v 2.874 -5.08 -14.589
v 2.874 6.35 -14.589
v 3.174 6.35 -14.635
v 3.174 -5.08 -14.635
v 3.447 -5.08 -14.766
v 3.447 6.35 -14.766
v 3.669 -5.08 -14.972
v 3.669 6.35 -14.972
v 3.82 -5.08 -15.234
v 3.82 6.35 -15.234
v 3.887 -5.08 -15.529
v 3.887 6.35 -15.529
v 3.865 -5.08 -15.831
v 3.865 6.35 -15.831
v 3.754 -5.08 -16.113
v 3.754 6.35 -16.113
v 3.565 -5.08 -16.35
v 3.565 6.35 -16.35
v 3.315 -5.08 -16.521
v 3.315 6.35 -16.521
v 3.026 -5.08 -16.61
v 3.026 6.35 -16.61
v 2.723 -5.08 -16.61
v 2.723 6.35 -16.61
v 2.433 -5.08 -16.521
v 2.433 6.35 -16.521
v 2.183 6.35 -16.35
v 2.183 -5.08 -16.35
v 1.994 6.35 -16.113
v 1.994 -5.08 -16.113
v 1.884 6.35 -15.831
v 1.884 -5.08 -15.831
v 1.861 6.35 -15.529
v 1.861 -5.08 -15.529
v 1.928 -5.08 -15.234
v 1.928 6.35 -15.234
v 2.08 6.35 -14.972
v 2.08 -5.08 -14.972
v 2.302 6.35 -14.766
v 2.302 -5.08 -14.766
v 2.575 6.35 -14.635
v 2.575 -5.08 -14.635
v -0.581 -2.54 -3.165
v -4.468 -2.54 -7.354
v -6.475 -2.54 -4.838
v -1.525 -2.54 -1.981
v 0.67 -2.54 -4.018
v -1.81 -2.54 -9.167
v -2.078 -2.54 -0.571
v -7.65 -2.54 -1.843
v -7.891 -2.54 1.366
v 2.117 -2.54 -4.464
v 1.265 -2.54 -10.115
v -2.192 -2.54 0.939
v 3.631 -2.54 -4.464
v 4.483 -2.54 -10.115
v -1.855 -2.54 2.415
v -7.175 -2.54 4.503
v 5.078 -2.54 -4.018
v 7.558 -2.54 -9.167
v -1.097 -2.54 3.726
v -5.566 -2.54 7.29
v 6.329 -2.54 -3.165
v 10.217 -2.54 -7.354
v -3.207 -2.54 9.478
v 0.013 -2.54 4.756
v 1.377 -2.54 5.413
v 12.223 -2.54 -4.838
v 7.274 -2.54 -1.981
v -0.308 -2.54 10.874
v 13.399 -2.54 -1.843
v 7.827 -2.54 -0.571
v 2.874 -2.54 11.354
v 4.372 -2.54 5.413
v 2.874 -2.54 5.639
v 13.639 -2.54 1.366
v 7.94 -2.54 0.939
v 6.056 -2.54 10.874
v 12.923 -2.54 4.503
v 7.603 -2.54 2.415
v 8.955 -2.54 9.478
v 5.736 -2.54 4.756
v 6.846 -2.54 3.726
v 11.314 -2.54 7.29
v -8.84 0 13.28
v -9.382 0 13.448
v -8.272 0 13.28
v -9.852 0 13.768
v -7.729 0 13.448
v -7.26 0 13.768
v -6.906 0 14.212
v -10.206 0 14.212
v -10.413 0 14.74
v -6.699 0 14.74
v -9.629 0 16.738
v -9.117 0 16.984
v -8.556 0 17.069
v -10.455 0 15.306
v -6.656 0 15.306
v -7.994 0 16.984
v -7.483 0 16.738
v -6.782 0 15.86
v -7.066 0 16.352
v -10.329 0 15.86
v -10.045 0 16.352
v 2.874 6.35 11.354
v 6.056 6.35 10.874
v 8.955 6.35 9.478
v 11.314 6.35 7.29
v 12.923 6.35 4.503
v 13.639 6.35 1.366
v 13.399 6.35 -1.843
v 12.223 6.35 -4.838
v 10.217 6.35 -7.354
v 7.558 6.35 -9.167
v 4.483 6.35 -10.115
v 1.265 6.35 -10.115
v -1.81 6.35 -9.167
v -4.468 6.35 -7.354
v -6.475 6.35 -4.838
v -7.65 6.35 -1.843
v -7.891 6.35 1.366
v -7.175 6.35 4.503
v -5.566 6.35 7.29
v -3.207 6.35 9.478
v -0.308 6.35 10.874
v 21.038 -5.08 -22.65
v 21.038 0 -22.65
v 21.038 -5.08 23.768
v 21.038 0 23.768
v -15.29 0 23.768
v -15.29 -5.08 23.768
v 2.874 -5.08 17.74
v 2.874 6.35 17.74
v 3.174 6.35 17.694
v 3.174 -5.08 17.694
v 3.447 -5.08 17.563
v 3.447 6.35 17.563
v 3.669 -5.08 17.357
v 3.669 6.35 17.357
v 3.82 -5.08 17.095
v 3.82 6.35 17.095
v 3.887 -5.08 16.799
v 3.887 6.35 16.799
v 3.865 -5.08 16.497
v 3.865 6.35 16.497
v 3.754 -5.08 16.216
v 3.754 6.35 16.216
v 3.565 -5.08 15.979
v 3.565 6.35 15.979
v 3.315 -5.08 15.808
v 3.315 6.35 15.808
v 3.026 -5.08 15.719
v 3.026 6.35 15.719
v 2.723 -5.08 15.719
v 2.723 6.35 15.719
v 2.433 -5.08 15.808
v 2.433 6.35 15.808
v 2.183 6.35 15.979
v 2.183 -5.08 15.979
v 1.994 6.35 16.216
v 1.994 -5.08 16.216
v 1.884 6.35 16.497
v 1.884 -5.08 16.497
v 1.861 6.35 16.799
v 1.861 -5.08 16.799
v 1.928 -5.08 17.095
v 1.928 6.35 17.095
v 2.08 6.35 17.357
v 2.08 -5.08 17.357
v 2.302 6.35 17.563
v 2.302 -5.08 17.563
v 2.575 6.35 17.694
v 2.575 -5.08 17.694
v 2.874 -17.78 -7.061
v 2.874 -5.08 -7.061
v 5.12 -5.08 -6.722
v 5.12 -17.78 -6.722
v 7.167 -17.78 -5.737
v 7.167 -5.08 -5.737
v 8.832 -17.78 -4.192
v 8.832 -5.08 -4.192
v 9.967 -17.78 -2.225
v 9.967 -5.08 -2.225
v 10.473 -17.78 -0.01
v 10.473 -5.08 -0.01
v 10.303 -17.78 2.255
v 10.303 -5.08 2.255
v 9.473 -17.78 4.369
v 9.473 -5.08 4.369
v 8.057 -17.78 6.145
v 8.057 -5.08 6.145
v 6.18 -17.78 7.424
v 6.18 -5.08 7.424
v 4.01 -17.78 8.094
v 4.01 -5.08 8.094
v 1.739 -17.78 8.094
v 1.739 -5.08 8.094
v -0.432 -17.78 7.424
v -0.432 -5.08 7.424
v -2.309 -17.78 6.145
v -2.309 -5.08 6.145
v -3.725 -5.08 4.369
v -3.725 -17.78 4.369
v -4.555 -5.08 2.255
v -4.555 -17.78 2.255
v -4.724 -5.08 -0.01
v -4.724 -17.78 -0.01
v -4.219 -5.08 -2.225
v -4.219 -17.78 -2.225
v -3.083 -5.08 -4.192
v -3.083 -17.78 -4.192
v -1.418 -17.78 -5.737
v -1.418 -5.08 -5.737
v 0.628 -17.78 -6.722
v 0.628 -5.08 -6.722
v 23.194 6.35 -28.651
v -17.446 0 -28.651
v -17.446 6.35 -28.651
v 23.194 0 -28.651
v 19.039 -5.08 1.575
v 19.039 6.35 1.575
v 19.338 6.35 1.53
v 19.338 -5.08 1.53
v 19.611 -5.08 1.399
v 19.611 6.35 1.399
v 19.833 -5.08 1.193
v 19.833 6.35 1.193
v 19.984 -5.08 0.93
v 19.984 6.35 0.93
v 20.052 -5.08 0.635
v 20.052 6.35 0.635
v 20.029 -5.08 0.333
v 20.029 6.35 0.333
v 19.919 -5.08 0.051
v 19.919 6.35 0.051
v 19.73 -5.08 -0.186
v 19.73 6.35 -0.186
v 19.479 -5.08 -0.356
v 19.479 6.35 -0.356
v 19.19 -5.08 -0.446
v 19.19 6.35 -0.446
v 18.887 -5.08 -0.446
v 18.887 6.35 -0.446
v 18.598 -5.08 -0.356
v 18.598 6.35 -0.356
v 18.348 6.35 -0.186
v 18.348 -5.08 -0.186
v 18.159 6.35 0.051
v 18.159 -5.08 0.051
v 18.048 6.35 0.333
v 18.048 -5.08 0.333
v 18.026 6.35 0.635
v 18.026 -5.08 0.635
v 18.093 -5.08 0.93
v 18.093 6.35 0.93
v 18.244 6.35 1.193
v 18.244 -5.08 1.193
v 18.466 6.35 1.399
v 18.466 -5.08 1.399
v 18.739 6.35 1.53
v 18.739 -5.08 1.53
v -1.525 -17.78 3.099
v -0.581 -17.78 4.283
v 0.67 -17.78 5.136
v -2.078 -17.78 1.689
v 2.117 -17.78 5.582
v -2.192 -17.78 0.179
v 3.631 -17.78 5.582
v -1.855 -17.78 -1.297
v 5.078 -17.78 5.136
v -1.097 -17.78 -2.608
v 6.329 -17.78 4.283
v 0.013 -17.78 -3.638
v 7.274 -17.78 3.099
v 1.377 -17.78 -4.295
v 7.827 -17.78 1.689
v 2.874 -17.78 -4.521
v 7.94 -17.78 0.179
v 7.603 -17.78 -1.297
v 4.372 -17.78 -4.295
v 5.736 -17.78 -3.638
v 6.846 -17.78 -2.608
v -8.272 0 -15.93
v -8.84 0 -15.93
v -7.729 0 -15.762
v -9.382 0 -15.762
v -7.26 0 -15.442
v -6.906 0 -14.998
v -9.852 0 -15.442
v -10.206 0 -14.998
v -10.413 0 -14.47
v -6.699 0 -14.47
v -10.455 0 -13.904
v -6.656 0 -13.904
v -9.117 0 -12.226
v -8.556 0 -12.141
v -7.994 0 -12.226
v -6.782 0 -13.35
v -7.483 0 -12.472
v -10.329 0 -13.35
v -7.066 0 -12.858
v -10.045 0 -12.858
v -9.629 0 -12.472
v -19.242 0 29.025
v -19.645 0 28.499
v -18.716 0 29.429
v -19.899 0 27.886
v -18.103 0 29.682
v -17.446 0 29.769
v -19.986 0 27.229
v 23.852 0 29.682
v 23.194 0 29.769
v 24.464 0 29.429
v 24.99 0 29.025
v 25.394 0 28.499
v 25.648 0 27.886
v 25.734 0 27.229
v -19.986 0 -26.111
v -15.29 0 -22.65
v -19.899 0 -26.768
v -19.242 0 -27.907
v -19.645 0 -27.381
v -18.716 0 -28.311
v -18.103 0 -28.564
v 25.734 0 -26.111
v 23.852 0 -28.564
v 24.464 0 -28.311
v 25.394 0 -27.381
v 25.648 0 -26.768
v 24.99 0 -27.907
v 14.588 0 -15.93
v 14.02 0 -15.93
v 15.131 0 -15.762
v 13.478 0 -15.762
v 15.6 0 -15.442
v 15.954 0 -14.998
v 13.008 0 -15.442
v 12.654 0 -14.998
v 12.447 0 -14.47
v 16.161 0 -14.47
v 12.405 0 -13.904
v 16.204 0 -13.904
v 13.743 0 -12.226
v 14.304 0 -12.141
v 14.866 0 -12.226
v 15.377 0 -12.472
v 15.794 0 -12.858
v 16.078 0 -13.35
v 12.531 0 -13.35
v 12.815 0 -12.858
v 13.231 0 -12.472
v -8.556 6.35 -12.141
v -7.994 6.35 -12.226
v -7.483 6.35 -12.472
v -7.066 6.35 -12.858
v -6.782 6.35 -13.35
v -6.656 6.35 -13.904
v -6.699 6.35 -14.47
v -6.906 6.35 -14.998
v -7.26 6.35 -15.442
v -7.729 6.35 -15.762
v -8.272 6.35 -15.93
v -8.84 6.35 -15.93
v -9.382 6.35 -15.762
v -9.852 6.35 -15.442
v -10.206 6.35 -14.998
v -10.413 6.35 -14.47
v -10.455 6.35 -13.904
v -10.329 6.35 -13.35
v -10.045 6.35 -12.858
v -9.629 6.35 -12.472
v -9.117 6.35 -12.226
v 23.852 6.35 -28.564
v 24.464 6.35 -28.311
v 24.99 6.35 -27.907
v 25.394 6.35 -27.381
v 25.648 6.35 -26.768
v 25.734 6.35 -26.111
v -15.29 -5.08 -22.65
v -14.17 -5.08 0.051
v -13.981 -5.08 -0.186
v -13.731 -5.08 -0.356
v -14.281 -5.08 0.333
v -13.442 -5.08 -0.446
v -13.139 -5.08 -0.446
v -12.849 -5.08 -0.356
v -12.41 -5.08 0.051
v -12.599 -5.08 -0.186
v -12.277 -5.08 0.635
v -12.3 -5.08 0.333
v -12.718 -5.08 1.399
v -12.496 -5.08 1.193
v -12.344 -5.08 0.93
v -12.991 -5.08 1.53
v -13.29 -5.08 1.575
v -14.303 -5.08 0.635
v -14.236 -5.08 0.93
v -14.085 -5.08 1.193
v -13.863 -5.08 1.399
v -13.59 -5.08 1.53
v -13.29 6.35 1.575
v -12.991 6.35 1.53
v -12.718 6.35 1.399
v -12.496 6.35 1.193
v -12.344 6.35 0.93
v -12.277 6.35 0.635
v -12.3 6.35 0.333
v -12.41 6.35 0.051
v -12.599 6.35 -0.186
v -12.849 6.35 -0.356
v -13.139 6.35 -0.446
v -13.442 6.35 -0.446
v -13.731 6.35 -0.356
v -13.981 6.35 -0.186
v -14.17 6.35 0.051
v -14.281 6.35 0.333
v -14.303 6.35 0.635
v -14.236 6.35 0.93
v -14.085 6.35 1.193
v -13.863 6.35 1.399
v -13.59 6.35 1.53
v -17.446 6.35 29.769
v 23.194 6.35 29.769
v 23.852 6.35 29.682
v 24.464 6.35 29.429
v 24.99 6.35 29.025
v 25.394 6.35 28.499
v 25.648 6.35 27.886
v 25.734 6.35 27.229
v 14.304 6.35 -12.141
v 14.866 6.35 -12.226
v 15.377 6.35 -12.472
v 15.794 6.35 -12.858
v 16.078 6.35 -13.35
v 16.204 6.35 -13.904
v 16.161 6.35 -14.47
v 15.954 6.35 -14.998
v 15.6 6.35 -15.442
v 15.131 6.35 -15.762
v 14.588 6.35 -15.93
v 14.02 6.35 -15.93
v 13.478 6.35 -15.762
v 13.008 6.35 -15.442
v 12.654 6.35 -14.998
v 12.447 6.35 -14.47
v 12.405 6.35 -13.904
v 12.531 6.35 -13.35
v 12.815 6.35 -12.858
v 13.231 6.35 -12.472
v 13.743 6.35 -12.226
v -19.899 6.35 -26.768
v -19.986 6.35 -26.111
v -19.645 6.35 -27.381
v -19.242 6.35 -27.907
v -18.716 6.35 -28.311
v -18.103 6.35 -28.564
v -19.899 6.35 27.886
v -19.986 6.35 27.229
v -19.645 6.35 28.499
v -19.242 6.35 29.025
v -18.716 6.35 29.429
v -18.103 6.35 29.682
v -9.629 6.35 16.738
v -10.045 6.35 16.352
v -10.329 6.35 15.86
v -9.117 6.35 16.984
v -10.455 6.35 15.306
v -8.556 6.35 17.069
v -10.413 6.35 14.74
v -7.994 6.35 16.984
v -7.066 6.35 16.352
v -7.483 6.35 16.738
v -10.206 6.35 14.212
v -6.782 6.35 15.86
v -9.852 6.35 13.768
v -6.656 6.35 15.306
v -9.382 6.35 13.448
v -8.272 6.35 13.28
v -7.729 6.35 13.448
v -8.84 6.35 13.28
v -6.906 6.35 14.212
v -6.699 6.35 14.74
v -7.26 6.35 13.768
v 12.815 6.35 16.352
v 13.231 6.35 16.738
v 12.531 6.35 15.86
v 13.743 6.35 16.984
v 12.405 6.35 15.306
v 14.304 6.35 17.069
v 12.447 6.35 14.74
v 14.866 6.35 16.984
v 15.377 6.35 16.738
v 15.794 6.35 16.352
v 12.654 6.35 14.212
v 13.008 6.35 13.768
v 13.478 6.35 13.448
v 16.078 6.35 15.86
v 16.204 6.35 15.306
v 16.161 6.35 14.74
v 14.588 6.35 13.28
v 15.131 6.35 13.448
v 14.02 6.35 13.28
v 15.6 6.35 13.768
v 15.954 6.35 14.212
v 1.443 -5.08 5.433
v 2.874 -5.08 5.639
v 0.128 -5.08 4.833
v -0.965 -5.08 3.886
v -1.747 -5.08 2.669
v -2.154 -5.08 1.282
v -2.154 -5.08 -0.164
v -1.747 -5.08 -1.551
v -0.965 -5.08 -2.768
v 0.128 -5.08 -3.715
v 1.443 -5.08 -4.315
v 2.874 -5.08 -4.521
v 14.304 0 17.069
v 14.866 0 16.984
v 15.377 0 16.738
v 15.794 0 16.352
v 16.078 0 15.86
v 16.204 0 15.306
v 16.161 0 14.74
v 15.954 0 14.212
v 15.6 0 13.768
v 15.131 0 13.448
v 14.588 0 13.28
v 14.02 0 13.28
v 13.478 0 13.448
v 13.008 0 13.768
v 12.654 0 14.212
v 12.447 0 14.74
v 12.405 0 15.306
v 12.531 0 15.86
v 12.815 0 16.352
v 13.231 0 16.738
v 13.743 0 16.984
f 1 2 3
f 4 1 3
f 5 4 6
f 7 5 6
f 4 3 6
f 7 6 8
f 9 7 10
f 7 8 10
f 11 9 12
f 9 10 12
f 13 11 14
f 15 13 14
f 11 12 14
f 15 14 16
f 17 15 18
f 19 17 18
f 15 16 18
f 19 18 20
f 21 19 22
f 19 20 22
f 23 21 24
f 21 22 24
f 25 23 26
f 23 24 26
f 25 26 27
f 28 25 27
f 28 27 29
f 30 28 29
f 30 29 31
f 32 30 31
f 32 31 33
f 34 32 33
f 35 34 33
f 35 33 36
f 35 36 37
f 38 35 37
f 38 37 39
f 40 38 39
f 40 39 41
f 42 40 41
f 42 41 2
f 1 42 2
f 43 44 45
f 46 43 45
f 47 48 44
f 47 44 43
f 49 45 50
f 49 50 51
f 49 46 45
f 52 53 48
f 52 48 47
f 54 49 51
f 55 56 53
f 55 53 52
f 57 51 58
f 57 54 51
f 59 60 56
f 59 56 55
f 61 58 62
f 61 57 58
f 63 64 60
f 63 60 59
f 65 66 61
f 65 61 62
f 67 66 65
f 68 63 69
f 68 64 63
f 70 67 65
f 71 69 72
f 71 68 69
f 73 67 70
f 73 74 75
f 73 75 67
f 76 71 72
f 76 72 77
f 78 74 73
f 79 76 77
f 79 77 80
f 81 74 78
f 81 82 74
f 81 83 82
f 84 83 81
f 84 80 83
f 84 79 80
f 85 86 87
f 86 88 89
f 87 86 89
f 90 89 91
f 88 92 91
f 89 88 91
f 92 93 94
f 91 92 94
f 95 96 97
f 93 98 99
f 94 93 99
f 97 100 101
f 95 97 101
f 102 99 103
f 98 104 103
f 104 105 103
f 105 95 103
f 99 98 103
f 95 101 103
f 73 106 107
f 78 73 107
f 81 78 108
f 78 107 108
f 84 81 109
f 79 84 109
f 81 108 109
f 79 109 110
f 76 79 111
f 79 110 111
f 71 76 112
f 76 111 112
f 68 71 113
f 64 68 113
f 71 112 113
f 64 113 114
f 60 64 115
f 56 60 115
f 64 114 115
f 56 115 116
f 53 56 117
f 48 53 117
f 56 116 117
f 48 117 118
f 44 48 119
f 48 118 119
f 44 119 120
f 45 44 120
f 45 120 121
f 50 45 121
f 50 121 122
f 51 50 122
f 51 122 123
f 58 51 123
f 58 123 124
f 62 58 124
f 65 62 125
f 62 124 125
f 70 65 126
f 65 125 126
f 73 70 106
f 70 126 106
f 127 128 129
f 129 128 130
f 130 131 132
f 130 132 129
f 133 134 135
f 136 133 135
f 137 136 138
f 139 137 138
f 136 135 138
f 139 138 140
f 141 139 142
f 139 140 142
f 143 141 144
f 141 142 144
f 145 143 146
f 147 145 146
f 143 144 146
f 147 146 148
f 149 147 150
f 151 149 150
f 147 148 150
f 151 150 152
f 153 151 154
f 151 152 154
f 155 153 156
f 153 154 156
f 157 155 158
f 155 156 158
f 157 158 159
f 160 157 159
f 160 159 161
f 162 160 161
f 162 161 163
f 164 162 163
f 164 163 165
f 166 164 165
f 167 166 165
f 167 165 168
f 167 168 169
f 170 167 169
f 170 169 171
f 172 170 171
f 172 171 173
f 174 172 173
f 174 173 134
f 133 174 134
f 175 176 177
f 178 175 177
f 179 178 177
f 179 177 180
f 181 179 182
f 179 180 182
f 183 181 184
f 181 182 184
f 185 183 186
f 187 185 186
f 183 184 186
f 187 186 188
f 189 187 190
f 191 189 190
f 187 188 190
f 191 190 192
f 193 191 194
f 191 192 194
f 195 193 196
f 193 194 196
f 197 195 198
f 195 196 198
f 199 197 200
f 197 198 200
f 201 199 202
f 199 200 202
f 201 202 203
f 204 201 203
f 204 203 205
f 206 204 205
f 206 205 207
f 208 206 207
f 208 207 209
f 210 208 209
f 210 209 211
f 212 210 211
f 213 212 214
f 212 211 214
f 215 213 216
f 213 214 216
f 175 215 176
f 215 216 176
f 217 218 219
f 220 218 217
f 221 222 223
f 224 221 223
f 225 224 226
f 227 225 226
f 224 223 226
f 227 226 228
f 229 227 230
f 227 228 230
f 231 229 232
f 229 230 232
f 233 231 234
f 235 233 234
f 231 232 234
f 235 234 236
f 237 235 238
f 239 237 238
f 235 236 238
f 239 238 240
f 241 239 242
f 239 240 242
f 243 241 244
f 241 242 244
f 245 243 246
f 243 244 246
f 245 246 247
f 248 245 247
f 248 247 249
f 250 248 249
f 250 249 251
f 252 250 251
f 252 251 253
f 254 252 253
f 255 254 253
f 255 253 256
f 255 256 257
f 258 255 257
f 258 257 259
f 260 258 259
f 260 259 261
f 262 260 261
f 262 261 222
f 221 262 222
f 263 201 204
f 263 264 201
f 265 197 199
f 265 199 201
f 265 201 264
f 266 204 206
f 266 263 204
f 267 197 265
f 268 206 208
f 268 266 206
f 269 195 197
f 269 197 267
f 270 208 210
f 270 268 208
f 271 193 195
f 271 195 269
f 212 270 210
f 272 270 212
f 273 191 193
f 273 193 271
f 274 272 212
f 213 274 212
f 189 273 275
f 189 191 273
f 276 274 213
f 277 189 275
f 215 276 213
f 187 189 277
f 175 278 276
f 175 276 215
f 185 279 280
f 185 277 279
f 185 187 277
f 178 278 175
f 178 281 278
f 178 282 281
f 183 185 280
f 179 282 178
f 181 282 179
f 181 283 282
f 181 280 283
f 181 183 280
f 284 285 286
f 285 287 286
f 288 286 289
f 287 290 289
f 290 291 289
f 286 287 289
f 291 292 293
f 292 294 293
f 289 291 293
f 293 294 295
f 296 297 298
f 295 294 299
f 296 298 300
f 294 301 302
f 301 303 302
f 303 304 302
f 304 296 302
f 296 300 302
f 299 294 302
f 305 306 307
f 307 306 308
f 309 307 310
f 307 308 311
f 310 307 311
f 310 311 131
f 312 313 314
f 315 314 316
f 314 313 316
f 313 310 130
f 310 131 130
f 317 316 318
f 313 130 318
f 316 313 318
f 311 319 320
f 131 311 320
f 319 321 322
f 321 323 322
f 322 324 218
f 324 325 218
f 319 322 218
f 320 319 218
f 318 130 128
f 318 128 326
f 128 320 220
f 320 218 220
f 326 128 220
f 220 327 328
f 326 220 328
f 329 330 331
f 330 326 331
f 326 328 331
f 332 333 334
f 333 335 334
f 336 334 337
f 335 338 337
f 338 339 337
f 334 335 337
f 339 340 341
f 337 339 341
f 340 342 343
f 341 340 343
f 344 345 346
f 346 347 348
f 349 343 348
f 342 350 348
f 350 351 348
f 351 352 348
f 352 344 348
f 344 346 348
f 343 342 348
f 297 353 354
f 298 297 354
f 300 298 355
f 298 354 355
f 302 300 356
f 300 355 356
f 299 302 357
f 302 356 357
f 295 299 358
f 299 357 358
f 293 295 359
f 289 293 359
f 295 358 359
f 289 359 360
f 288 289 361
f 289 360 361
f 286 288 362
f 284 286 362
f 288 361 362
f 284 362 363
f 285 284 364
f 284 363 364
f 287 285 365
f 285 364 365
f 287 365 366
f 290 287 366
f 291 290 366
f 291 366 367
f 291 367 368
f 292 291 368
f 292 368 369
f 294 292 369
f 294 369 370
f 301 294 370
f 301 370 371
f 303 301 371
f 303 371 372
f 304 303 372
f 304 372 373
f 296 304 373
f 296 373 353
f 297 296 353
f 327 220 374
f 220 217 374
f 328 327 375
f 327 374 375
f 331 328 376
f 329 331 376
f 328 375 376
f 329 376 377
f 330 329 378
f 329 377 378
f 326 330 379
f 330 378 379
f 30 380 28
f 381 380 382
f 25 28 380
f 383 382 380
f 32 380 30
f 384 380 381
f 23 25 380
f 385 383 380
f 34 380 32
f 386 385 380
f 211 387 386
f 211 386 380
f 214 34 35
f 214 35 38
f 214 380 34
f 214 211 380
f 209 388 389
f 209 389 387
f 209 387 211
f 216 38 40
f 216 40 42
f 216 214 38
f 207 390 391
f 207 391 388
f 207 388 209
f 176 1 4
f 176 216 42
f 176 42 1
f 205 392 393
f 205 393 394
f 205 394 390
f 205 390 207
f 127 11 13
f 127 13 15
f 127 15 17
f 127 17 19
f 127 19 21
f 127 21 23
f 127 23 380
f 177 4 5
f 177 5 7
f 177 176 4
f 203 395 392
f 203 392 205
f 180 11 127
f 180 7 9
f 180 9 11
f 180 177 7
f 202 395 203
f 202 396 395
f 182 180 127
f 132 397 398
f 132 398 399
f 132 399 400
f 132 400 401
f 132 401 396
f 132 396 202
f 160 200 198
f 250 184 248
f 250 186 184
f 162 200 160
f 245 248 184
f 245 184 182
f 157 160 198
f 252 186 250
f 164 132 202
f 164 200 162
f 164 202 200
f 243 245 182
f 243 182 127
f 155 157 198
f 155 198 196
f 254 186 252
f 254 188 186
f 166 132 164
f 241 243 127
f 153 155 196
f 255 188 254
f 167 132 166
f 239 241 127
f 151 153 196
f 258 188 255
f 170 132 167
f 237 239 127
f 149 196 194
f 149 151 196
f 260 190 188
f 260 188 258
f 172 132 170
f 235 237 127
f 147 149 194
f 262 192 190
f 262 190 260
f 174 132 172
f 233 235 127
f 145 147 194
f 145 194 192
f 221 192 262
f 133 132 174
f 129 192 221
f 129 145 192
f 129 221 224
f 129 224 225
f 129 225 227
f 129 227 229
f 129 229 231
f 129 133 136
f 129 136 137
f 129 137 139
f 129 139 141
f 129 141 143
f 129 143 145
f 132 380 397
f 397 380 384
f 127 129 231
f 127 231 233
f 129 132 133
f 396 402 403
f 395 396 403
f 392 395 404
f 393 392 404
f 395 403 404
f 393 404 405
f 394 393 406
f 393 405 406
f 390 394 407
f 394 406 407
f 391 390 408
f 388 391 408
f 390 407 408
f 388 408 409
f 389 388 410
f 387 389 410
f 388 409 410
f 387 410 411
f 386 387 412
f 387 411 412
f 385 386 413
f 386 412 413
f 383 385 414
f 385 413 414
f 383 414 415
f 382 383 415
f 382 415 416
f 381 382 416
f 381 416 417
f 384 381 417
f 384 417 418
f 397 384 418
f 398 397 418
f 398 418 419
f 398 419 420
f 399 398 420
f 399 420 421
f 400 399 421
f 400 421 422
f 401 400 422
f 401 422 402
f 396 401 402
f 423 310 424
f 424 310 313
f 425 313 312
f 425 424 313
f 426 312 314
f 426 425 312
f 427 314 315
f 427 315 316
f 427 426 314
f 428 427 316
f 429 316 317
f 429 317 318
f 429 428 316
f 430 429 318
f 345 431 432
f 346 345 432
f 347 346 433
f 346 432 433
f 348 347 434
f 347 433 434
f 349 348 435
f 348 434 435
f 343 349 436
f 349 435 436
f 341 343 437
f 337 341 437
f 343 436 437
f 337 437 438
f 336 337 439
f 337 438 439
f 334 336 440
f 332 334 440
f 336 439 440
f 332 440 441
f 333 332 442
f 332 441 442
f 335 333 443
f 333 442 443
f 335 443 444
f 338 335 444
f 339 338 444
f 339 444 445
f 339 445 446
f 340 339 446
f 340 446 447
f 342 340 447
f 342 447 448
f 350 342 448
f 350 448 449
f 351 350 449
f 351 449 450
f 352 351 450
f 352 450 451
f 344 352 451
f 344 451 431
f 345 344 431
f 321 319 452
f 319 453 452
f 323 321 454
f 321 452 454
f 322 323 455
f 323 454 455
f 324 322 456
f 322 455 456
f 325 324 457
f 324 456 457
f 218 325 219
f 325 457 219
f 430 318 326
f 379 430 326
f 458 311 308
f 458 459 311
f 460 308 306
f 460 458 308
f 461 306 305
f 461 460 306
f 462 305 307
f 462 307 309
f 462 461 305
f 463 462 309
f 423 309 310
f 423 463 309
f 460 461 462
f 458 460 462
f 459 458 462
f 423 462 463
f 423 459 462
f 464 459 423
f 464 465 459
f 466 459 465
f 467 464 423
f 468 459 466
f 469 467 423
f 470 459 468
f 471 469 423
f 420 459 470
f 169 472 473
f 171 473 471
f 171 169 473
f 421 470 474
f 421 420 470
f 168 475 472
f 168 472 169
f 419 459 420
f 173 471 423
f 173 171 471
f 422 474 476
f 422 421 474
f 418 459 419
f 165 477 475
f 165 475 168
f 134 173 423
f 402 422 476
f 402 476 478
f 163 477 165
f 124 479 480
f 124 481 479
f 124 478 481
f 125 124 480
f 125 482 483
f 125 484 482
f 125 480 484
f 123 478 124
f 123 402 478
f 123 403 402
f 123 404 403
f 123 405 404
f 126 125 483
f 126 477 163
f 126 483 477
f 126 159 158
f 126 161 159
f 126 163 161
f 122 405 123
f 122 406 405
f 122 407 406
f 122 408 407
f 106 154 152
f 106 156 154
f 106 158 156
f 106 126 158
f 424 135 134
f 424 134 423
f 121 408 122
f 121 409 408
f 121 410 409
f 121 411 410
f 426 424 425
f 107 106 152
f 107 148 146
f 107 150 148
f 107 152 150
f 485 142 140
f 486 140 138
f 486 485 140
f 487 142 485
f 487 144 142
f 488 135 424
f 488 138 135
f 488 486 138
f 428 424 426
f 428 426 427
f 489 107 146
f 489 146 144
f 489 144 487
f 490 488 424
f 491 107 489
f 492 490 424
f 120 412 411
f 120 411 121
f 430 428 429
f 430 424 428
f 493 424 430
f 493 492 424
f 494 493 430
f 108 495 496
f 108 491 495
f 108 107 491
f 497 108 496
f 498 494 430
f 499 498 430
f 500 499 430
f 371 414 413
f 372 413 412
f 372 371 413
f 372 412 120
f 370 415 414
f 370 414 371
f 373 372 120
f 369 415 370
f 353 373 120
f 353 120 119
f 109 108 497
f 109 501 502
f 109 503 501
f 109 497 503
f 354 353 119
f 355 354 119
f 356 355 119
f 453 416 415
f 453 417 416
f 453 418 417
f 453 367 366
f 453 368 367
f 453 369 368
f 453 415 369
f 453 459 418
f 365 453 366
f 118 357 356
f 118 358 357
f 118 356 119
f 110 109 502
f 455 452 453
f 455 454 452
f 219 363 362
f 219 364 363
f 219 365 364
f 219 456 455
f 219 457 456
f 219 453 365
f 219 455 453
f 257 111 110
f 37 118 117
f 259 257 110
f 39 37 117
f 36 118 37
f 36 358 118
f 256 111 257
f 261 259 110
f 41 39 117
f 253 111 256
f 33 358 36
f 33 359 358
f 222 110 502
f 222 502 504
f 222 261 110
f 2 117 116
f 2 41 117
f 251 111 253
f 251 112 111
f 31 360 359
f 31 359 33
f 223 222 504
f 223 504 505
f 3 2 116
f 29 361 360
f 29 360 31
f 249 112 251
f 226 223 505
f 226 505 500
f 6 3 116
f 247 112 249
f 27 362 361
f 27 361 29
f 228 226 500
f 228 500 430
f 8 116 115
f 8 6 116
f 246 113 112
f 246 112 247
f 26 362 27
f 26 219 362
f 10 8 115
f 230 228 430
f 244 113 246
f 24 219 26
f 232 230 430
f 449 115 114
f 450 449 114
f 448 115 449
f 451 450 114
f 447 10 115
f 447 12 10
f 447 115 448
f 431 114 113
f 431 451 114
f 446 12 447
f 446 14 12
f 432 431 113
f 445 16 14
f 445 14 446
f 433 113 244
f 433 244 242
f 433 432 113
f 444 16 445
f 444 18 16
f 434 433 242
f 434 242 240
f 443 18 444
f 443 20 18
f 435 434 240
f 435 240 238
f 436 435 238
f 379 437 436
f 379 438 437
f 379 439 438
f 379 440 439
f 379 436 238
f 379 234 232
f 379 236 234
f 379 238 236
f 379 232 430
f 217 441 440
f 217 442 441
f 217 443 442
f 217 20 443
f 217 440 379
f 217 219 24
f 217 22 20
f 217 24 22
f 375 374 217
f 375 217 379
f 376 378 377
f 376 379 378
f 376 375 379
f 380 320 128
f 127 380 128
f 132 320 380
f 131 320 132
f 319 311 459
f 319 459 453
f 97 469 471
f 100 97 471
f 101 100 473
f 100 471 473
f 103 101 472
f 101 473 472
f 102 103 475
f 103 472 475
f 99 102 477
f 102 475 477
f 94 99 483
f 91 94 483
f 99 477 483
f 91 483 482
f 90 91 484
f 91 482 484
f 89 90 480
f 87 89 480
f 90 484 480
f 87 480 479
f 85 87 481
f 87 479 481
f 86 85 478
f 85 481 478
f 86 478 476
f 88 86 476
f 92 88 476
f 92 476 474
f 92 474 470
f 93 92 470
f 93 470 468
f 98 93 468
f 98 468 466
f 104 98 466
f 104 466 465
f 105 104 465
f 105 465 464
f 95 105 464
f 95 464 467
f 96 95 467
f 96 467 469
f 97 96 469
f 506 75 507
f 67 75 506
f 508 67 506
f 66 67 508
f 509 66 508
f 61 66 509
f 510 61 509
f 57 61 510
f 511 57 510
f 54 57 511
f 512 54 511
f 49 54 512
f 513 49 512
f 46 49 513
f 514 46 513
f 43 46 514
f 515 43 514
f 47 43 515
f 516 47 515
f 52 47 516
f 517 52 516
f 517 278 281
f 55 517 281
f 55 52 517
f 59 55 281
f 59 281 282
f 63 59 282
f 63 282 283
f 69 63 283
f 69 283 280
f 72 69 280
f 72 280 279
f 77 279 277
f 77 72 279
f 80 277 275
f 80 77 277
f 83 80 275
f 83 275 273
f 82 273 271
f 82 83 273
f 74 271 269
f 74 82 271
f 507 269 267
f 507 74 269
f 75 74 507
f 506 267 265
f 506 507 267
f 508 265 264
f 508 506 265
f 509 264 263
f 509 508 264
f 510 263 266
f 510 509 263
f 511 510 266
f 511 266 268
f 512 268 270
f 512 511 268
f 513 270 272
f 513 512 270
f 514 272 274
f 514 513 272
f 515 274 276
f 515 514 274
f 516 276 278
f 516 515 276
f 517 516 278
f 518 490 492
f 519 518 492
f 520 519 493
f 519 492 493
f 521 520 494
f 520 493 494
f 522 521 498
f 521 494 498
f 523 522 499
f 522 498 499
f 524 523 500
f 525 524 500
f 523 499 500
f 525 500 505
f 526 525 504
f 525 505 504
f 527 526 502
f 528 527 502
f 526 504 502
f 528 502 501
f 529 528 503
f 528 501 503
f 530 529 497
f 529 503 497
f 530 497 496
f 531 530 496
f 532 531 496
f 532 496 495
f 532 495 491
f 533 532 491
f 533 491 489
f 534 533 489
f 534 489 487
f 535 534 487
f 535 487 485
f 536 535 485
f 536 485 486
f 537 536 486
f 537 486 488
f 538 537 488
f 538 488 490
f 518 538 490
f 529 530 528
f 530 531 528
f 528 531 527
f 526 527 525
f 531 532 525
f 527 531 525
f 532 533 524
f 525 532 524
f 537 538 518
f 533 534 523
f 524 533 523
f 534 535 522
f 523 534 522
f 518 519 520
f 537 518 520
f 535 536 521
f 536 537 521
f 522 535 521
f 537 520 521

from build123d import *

# Parameters (mm, degrees)
SKETCH1_W           = 45.72
SKETCH1_H           = 58.42
BOSS_EXTRUDE1_DEPTH = 6.35
SKETCH2_R           = 1.905
CUT_EXTRUDE1_DEPTH  = 40.859352933
SKETCH3_W           = 36.327462092
SKETCH3_H           = 46.418423785
BOSS_EXTRUDE2_DEPTH = 5.08
SKETCH4_R           = 7.62
SKETCH4_R_2         = 5.08
BOSS_EXTRUDE3_DEPTH = 12.7
FILLET1_R           = 2.54
SKETCH5_R           = 10.795
CUT_EXTRUDE2_DEPTH  = 8.89
SKETCH6_R           = 1.016
CUT_EXTRUDE3_DEPTH  = 19.05
CUT_EXTRUDE4_START  = -19.05
SKETCH4_2_R         = 5.08
CUT_EXTRUDE4_DEPTH  = 19.05


with BuildPart() as part:
    # Sketch1 → Boss-Extrude1 (new body)
    with BuildSketch(Plane(origin=(0, 0, 0), x_dir=(1, 0, 0), z_dir=(0, 1, 0))):
        with Locations((2.874210526, -0.559043062)):
            Rectangle(SKETCH1_W, SKETCH1_H)
    extrude(amount=BOSS_EXTRUDE1_DEPTH)

    # Sketch2 → Cut-Extrude1 (cut, through all)
    with BuildSketch(Plane(origin=(0, 6.35, 0), x_dir=(1, 0, 0), z_dir=(0, 1, 0))):
        with Locations((-8.555789474, 14.045956938)):
            Circle(SKETCH2_R)
        with Locations((14.304210526, 14.045956938)):
            Circle(SKETCH2_R)
        with Locations((-8.555789474, -15.164043062)):
            Circle(SKETCH2_R)
        with Locations((14.304210526, -15.164043062)):
            Circle(SKETCH2_R)
    extrude(amount=-CUT_EXTRUDE1_DEPTH, mode=Mode.SUBTRACT)

    # Sketch3 → Boss-Extrude2 (add)
    with BuildSketch(Plane.XZ):
        with Locations((2.874210526, 0.559043062)):
            Rectangle(SKETCH3_W, SKETCH3_H)
    extrude(amount=BOSS_EXTRUDE2_DEPTH)

    # Sketch4 → Boss-Extrude3 (add)
    with BuildSketch(Plane.XZ.offset(5.08)):
        with Locations((2.874210526, 0.559043062)):
            Circle(SKETCH4_R)
        with Locations((2.874210526, 0.559043062)):
            Circle(SKETCH4_R_2, mode=Mode.SUBTRACT)
    extrude(amount=BOSS_EXTRUDE3_DEPTH)

    # Fillet1
    fillet1_edges = [part.edges().sort_by_distance(p)[0] for p in [
        (25.734210526, 3.175, -28.650956938),
        (-19.985789474, 3.175, -28.650956938),
        (-19.985789474, 3.175, 29.769043062),
        (25.734210526, 3.175, 29.769043062),
    ]]
    fillet(fillet1_edges, radius=FILLET1_R)

    # Sketch5 → Cut-Extrude2 (cut)
    with BuildSketch(Plane(origin=(0, 6.35, 0), x_dir=(1, 0, 0), z_dir=(0, 1, 0))):
        with Locations((2.874210526, -0.559043062)):
            Circle(SKETCH5_R)
    extrude(amount=-CUT_EXTRUDE2_DEPTH, mode=Mode.SUBTRACT)

    # Sketch6 → Cut-Extrude3 (cut)
    with BuildSketch(Plane(origin=(0, 6.35, 0), x_dir=(1, 0, 0), z_dir=(0, 1, 0))):
        with Locations((2.874210526, 15.605417956)):
            Circle(SKETCH6_R)
        with Locations((-13.290250492, -0.559043062)):
            Circle(SKETCH6_R)
        with Locations((2.874210526, -16.72350408)):
            Circle(SKETCH6_R)
        with Locations((19.038671544, -0.559043062)):
            Circle(SKETCH6_R)
    extrude(amount=-CUT_EXTRUDE3_DEPTH, mode=Mode.SUBTRACT)

    # Sketch4<2> → Cut-Extrude4 (cut)
    with BuildSketch(Plane.XZ.offset(5.08).offset(CUT_EXTRUDE4_START)):
        with Locations((2.874210526, 0.559043062)):
            Circle(SKETCH4_2_R)
    extrude(amount=CUT_EXTRUDE4_DEPTH, mode=Mode.SUBTRACT)


solid = part.part
